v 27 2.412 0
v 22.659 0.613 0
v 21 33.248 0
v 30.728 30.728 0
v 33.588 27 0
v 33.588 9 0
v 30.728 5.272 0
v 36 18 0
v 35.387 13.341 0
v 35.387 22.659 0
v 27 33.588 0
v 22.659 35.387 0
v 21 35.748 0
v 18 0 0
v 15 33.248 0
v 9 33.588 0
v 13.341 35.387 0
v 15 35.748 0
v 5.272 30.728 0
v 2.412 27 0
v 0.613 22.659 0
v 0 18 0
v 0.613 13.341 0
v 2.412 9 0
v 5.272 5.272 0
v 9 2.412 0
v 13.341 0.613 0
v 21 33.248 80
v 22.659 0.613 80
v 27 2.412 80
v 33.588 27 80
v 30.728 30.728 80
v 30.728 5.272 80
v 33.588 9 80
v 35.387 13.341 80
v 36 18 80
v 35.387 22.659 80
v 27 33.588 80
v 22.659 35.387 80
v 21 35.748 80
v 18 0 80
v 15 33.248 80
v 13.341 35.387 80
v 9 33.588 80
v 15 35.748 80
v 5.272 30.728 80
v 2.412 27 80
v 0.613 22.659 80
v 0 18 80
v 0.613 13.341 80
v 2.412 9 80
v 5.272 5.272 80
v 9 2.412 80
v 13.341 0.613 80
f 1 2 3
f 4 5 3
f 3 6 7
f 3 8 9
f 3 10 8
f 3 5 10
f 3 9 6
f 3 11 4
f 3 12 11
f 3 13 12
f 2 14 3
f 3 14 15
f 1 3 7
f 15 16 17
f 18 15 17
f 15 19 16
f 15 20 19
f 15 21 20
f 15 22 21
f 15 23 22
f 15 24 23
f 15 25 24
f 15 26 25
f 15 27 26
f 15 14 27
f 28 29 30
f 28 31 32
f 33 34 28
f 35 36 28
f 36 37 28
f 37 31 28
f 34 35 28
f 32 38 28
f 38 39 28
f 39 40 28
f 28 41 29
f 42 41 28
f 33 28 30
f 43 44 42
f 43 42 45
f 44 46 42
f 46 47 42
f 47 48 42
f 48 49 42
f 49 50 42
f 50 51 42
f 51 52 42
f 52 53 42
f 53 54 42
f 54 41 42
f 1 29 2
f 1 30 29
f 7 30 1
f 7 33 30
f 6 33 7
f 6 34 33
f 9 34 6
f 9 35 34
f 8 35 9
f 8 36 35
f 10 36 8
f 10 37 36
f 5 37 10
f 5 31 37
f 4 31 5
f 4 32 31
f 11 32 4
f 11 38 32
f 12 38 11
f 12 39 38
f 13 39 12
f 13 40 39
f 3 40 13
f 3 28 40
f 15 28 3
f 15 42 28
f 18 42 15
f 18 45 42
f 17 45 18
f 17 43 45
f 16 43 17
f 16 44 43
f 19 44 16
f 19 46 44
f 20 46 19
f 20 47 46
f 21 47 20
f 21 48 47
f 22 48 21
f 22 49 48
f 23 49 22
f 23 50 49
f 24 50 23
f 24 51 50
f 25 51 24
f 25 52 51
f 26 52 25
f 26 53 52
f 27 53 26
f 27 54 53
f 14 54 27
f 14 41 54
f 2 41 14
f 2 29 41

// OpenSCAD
$fn = 32;

// ----------------------------------------------------------------------
// Keyway shaft: d36 shaft, key 6 x 2.5 mm
// ----------------------------------------------------------------------

// --- parameters (mm) ---
shaft_r = 18;             // shaft radius
key_w = 6;                // keyway width
key_d = 2.5;              // keyway depth below the surface line
plate_t = 80;             // shaft length, Z (extrusion height)
fit_tol = 0.05;           // declared fit tolerance (prompt contract)
free_tol = 0.3;           // declared free tolerance (prompt contract)

shaft_d = 2 * shaft_r;  // shaft diameter
circle_step = 15;  // polygon sampling step, degrees

profile = [[13.341, 35.387], [9, 33.588], [5.272, 30.728], [2.412, 27], [0.613, 22.659], [0, 18], [0.613, 13.341], [2.412, 9], [5.272, 5.272], [9, 2.412], [13.341, 0.613], [18, 0], [22.659, 0.613], [27, 2.412], [30.728, 5.272], [33.588, 9], [35.387, 13.341], [36, 18], [35.387, 22.659], [33.588, 27], [30.728, 30.728], [27, 33.588], [22.659, 35.387], [21, 35.748], [21, 33.248], [15, 33.248], [15, 35.748]];  // primary outline, 27 points, counter clockwise

// --- the one profile operation ---
linear_extrude(height = plate_t) polygon(points = profile);
